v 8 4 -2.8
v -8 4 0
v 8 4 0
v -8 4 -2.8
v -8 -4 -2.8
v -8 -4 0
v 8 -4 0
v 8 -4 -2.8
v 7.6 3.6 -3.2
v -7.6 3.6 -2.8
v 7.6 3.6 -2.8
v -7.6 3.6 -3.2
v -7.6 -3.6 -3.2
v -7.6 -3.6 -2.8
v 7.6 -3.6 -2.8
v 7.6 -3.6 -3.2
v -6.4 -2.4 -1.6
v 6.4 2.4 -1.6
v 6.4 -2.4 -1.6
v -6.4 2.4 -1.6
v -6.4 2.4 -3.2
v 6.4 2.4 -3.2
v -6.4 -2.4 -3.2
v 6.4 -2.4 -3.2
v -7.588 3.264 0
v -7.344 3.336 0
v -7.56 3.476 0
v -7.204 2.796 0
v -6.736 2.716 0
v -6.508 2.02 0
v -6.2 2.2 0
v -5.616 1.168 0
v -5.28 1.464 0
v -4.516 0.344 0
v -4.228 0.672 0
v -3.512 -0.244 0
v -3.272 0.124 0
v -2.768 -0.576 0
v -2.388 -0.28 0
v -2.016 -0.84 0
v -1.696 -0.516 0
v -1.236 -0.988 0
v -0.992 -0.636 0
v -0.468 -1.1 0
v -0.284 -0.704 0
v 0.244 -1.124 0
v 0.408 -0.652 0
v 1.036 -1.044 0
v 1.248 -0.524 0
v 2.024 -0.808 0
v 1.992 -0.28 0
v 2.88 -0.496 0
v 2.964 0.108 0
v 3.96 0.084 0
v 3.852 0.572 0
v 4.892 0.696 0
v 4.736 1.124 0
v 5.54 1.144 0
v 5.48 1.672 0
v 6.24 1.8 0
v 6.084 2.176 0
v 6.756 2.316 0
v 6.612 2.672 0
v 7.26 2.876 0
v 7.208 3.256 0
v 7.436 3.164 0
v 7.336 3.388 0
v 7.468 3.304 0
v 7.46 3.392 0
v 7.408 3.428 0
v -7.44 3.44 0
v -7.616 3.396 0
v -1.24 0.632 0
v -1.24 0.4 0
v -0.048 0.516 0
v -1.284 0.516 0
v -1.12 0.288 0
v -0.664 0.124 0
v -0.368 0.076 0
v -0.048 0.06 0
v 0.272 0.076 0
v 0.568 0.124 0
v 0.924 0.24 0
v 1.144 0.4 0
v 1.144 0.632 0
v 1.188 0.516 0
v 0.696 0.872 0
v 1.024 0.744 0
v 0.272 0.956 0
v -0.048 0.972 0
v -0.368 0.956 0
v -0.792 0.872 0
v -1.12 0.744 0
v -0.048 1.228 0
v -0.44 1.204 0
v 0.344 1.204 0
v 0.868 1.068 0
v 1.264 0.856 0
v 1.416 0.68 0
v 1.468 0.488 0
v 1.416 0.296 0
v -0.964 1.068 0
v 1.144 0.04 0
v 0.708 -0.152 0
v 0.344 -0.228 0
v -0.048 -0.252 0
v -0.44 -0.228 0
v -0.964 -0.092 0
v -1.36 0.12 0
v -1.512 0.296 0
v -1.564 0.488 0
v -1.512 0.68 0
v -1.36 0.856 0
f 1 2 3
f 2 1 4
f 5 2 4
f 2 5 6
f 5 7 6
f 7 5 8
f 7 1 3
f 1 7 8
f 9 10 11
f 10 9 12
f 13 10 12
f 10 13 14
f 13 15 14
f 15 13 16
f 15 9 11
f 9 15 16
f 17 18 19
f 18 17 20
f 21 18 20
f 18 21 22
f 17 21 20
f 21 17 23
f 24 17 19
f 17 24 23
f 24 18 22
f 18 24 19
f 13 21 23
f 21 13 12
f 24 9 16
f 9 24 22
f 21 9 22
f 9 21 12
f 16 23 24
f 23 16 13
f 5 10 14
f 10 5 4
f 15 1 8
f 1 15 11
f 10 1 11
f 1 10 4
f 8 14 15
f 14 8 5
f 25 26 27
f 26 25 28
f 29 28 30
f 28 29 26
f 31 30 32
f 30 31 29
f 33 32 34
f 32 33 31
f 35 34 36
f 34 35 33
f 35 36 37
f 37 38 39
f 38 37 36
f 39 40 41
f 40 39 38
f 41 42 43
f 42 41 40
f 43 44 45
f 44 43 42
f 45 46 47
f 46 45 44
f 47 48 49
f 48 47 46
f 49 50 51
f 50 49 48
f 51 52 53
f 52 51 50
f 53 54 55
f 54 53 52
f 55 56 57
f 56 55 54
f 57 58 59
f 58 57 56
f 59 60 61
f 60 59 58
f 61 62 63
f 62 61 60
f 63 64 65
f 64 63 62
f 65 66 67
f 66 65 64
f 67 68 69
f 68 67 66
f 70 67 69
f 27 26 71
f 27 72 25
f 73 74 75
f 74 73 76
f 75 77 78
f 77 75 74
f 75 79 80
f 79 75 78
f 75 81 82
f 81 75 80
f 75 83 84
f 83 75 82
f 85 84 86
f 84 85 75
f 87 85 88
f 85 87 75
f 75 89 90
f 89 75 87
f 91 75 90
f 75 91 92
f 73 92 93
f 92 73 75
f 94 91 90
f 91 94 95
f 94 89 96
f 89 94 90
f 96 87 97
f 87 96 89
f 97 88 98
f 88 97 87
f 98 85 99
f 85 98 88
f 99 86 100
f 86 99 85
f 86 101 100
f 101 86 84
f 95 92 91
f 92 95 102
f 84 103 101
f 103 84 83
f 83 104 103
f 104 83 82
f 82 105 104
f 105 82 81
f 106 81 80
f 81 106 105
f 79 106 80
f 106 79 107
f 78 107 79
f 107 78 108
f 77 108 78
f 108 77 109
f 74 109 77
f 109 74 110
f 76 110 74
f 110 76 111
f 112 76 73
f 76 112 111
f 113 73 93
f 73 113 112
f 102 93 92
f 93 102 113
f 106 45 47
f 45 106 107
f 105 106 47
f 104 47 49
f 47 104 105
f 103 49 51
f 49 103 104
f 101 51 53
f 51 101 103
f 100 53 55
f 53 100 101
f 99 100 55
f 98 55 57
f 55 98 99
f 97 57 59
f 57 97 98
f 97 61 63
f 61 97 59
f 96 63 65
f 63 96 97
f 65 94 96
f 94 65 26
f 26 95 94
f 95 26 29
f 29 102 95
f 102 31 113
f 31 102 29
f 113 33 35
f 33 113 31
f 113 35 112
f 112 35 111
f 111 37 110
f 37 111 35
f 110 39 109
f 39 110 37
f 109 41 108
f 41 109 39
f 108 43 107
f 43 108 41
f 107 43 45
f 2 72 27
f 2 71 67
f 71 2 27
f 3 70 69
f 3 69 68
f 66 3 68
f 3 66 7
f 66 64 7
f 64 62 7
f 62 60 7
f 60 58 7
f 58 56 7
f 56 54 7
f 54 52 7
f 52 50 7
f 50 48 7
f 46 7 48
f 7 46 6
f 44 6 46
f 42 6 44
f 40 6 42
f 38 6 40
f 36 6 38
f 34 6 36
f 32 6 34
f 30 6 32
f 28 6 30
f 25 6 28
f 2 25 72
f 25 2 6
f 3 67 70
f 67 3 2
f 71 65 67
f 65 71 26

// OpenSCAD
// file: ../p/box5.scad
use <../lib.scad>
function ldraw_lib__box5() = [
// 0 Box with 5 Faces and All Edges
// 0 Name: box5.dat
// 0 Author: James Jessiman
// 0 !LDRAW_ORG Primitive UPDATE 2012-01
// 0 !LICENSE Licensed under CC BY 4.0 : see CAreadme.txt
// 
// 0 BFC CERTIFY CCW
  [0,"BFC","CERTIFY"],
  [0,"BFC","CCW"],
// 
// 0 !HISTORY 2002-04-03 [sbliss] Modified for BFC compliance
// 0 !HISTORY 2002-04-25 [PTadmin] Official Update 2002-02
// 0 !HISTORY 2007-06-24 [PTadmin] Header formatted for Contributor Agreement
// 0 !HISTORY 2008-07-01 [PTadmin] Official Update 2008-01
// 0 !HISTORY 2012-02-16 [Philo] Changed to CCW
// 0 !HISTORY 2012-03-30 [PTadmin] Official Update 2012-01
// 
// 
// 2 24 1 1 1 -1 1 1
  [2,24,1,1,1,-1,1,1],
// 2 24 -1 1 1 -1 1 -1
  [2,24,-1,1,1,-1,1,-1],
// 2 24 -1 1 -1 1 1 -1
  [2,24,-1,1,-1,1,1,-1],
// 2 24 1 1 -1 1 1 1
  [2,24,1,1,-1,1,1,1],
// 2 24 1 0 1 -1 0 1
  [2,24,1,0,1,-1,0,1],
// 2 24 -1 0 1 -1 0 -1
  [2,24,-1,0,1,-1,0,-1],
// 2 24 -1 0 -1 1 0 -1
  [2,24,-1,0,-1,1,0,-1],
// 2 24 1 0 -1 1 0 1
  [2,24,1,0,-1,1,0,1],
// 2 24 1 0 1 1 1 1
  [2,24,1,0,1,1,1,1],
// 2 24 -1 0 1 -1 1 1
  [2,24,-1,0,1,-1,1,1],
// 2 24 1 0 -1 1 1 -1
  [2,24,1,0,-1,1,1,-1],
// 2 24 -1 0 -1 -1 1 -1
  [2,24,-1,0,-1,-1,1,-1],
// 4 16 -1 1 1 1 1 1 1 1 -1 -1 1 -1
  [4,16,-1,1,1,1,1,1,1,1,-1,-1,1,-1],
// 4 16 -1 1 1 -1 0 1 1 0 1 1 1 1
  [4,16,-1,1,1,-1,0,1,1,0,1,1,1,1],
// 4 16 -1 1 -1 -1 0 -1 -1 0 1 -1 1 1
  [4,16,-1,1,-1,-1,0,-1,-1,0,1,-1,1,1],
// 4 16 1 1 -1 1 0 -1 -1 0 -1 -1 1 -1
  [4,16,1,1,-1,1,0,-1,-1,0,-1,-1,1,-1],
// 4 16 1 1 1 1 0 1 1 0 -1 1 1 -1
  [4,16,1,1,1,1,0,1,1,0,-1,1,1,-1],
];
module ldraw_lib__box5(step=0, col=false, unit=2/5, alt=false, line=0.2, solid=!$preview)
    makepoly(ldraw_lib__box5(), step=step, col=col, unit=unit, alt=alt, line=line, solid=solid);
ldraw_lib__box5(line=0.2);
// file: ../p/box4.scad
use <../lib.scad>
function ldraw_lib__box4() = [
// 0 Box with 4 Faces (2 Parallel Pairs) and All Edges
// 0 Name: box4.dat
// 0 Author: James Jessiman
// 0 !LDRAW_ORG Primitive UPDATE 2012-01
// 0 !LICENSE Licensed under CC BY 4.0 : see CAreadme.txt
// 
// 0 BFC CERTIFY CCW
  [0,"BFC","CERTIFY"],
  [0,"BFC","CCW"],
// 
// 0 !HISTORY 2002-04-03 [sbliss] Modified for BFC compliance
// 0 !HISTORY 2002-04-25 [PTadmin] Official Update 2002-02
// 0 !HISTORY 2007-06-24 [PTadmin] Header formatted for Contributor Agreement
// 0 !HISTORY 2008-07-01 [PTadmin] Official Update 2008-01
// 0 !HISTORY 2012-02-16 [Philo] Changed to CCW
// 0 !HISTORY 2012-03-30 [PTadmin] Official Update 2012-01
// 
// 
// 2 24 1 1 1 -1 1 1
  [2,24,1,1,1,-1,1,1],
// 2 24 -1 1 1 -1 1 -1
  [2,24,-1,1,1,-1,1,-1],
// 2 24 -1 1 -1 1 1 -1
  [2,24,-1,1,-1,1,1,-1],
// 2 24 1 1 -1 1 1 1
  [2,24,1,1,-1,1,1,1],
// 2 24 1 0 1 -1 0 1
  [2,24,1,0,1,-1,0,1],
// 2 24 -1 0 1 -1 0 -1
  [2,24,-1,0,1,-1,0,-1],
// 2 24 -1 0 -1 1 0 -1
  [2,24,-1,0,-1,1,0,-1],
// 2 24 1 0 -1 1 0 1
  [2,24,1,0,-1,1,0,1],
// 2 24 1 0 1 1 1 1
  [2,24,1,0,1,1,1,1],
// 2 24 -1 0 1 -1 1 1
  [2,24,-1,0,1,-1,1,1],
// 2 24 1 0 -1 1 1 -1
  [2,24,1,0,-1,1,1,-1],
// 2 24 -1 0 -1 -1 1 -1
  [2,24,-1,0,-1,-1,1,-1],
// 4 16 -1 1 1 -1 0 1 1 0 1 1 1 1
  [4,16,-1,1,1,-1,0,1,1,0,1,1,1,1],
// 4 16 -1 1 -1 -1 0 -1 -1 0 1 -1 1 1
  [4,16,-1,1,-1,-1,0,-1,-1,0,1,-1,1,1],
// 4 16 1 1 -1 1 0 -1 -1 0 -1 -1 1 -1
  [4,16,1,1,-1,1,0,-1,-1,0,-1,-1,1,-1],
// 4 16 1 1 1 1 0 1 1 0 -1 1 1 -1
  [4,16,1,1,1,1,0,1,1,0,-1,1,1,-1],
];
module ldraw_lib__box4(step=0, col=false, unit=2/5, alt=false, line=0.2, solid=!$preview)
    makepoly(ldraw_lib__box4(), step=step, col=col, unit=unit, alt=alt, line=line, solid=solid);
ldraw_lib__box4(line=0.2);
// file: s/3069bs01.scad
use <../../lib.scad>
use <../../p/box4.scad>
use <../../p/box5.scad>
function ldraw_lib__s__3069bs01() = [
// 0 ~Tile  1 x  2 with Groove without Top Face
// 0 Name: s\3069bs01.dat
// 0 Author: Santeri Piippo [arezey]
// 0 !LDRAW_ORG Subpart UPDATE 2010-02
// 0 !LICENSE Licensed under CC BY 4.0 : see CAreadme.txt
// 
// 0 BFC CERTIFY CCW
  [0,"BFC","CERTIFY"],
  [0,"BFC","CCW"],
// 
// 0 !HISTORY 2010-07-05 [PTadmin] Official Update 2010-02
// 
// 
// 1 16 0 0 0 20 0 0 0 7 0 0 0 10 box4.dat
  [1,16,0,0,0,20,0,0,0,7,0,0,0,10, ldraw_lib__box4()],
// 1 16 0 7 0 19 0 0 0 1 0 0 0 9 box4.dat
  [1,16,0,7,0,19,0,0,0,1,0,0,0,9, ldraw_lib__box4()],
// 0 BFC INVERTNEXT
  [0,"BFC","INVERTNEXT"],
// 1 16 0 8 0 16 0 0 0 -4 0 0 0 6 box5.dat
  [1,16,0,8,0,16,0,0,0,-4,0,0,0,6, ldraw_lib__box5()],
// 4 16 -19 8 9 -16 8 6 -16 8 -6 -19 8 -9
  [4,16,-19,8,9,-16,8,6,-16,8,-6,-19,8,-9],
// 4 16 19 8 -9 16 8 -6 16 8 6 19 8 9
  [4,16,19,8,-9,16,8,-6,16,8,6,19,8,9],
// 4 16 19 8 9 16 8 6 -16 8 6 -19 8 9
  [4,16,19,8,9,16,8,6,-16,8,6,-19,8,9],
// 4 16 -19 8 -9 -16 8 -6 16 8 -6 19 8 -9
  [4,16,-19,8,-9,-16,8,-6,16,8,-6,19,8,-9],
// 4 16 -20 7 10 -19 7 9 -19 7 -9 -20 7 -10
  [4,16,-20,7,10,-19,7,9,-19,7,-9,-20,7,-10],
// 4 16 20 7 -10 19 7 -9 19 7 9 20 7 10
  [4,16,20,7,-10,19,7,-9,19,7,9,20,7,10],
// 4 16 20 7 10 19 7 9 -19 7 9 -20 7 10
  [4,16,20,7,10,19,7,9,-19,7,9,-20,7,10],
// 4 16 -20 7 -10 -19 7 -9 19 7 -9 20 7 -10
  [4,16,-20,7,-10,-19,7,-9,19,7,-9,20,7,-10],
// 0 //
];
module ldraw_lib__s__3069bs01(step=0, col=false, unit=2/5, alt=false, line=0.2, solid=!$preview)
    makepoly(ldraw_lib__s__3069bs01(), step=step, col=col, unit=unit, alt=alt, line=line, solid=solid);
ldraw_lib__s__3069bs01(line=0.2);
// main file
use <../lib.scad>
use <s/3069bs01.scad>
function ldraw_lib__3069bpx4() = [
// 0 Tile  1 x  2 with Black Arc and Metallic Gold Button Pattern
// 0 Name: 3069bpx4.dat
// 0 Author: Gerald Lasser [GeraldLasser]
// 0 !LDRAW_ORG Part UPDATE 2020-03
// 0 !LICENSE Licensed under CC BY 4.0 : see CAreadme.txt
// 
// 0 BFC CERTIFY CCW
  [0,"BFC","CERTIFY"],
  [0,"BFC","CCW"],
// 
// 0 !KEYWORDS Bricklink 3069bpb376, Collectible Minifigures, Date Night Marge
// 0 !KEYWORDS Purse, The Simpsons
// 
// 0 !HISTORY 2020-12-29 [PTadmin] Official Update 2020-03
// 
// 
// 1 16 0 0 0 1 0 0 0 1 0 0 0 1 s\3069bs01.dat
  [1,16,0,0,0,1,0,0,0,1,0,0,0,1, ldraw_lib__s__3069bs01()],
// 4 0 -18.9 0 8.69 -18.97 0 8.16 -18.01 0 6.99 -18.36 0 8.34
  [4,0,-18.9,0,8.69,-18.97,0,8.16,-18.01,0,6.99,-18.36,0,8.34],
// 4 0 -16.84 0 6.79 -18.36 0 8.34 -18.01 0 6.99 -16.27 0 5.05
  [4,0,-16.84,0,6.79,-18.36,0,8.34,-18.01,0,6.99,-16.27,0,5.05],
// 4 0 -15.5 0 5.5 -16.84 0 6.79 -16.27 0 5.05 -14.04 0 2.92
  [4,0,-15.5,0,5.5,-16.84,0,6.79,-16.27,0,5.05,-14.04,0,2.92],
// 4 0 -13.2 0 3.66 -15.5 0 5.5 -14.04 0 2.92 -11.29 0 .86
  [4,0,-13.2,0,3.66,-15.5,0,5.5,-14.04,0,2.92,-11.29,0,.86],
// 4 0 -10.57 0 1.68 -13.2 0 3.66 -11.29 0 .86 -8.78 0 -.61
  [4,0,-10.57,0,1.68,-13.2,0,3.66,-11.29,0,.86,-8.78,0,-.61],
// 3 0 -10.57 0 1.68 -8.78 0 -.61 -8.18 0 .31
  [3,0,-10.57,0,1.68,-8.78,0,-.61,-8.18,0,.31],
// 4 0 -5.97 0 -.7 -8.18 0 .31 -8.78 0 -.61 -6.92 0 -1.44
  [4,0,-5.97,0,-.7,-8.18,0,.31,-8.78,0,-.61,-6.92,0,-1.44],
// 4 0 -5.97 0 -.7 -6.92 0 -1.44 -5.04 0 -2.1 -4.24 0 -1.29
  [4,0,-5.97,0,-.7,-6.92,0,-1.44,-5.04,0,-2.1,-4.24,0,-1.29],
// 4 0 -4.24 0 -1.29 -5.04 0 -2.1 -3.09 0 -2.47 -2.48 0 -1.59
  [4,0,-4.24,0,-1.29,-5.04,0,-2.1,-3.09,0,-2.47,-2.48,0,-1.59],
// 4 0 -2.48 0 -1.59 -3.09 0 -2.47 -1.17 0 -2.75 -.71 0 -1.76
  [4,0,-2.48,0,-1.59,-3.09,0,-2.47,-1.17,0,-2.75,-.71,0,-1.76],
// 4 0 -.71 0 -1.76 -1.17 0 -2.75 .61 0 -2.81 1.02 0 -1.63
  [4,0,-.71,0,-1.76,-1.17,0,-2.75,.61,0,-2.81,1.02,0,-1.63],
// 4 0 1.02 0 -1.63 .61 0 -2.81 2.59 0 -2.61 3.12 0 -1.31
  [4,0,1.02,0,-1.63,.61,0,-2.81,2.59,0,-2.61,3.12,0,-1.31],
// 4 0 3.12 0 -1.31 2.59 0 -2.61 5.06 0 -2.02 4.98 0 -.7
  [4,0,3.12,0,-1.31,2.59,0,-2.61,5.06,0,-2.02,4.98,0,-.7],
// 4 0 4.98 0 -.7 5.06 0 -2.02 7.2 0 -1.24 7.41 0 .27
  [4,0,4.98,0,-.7,5.06,0,-2.02,7.2,0,-1.24,7.41,0,.27],
// 4 0 7.41 0 .27 7.2 0 -1.24 9.9 0 .21 9.63 0 1.43
  [4,0,7.41,0,.27,7.2,0,-1.24,9.9,0,.21,9.63,0,1.43],
// 4 0 9.63 0 1.43 9.9 0 .21 12.23 0 1.74 11.84 0 2.81
  [4,0,9.63,0,1.43,9.9,0,.21,12.23,0,1.74,11.84,0,2.81],
// 4 0 11.84 0 2.81 12.23 0 1.74 13.85 0 2.86 13.7 0 4.18
  [4,0,11.84,0,2.81,12.23,0,1.74,13.85,0,2.86,13.7,0,4.18],
// 4 0 13.7 0 4.18 13.85 0 2.86 15.6 0 4.5 15.21 0 5.44
  [4,0,13.7,0,4.18,13.85,0,2.86,15.6,0,4.5,15.21,0,5.44],
// 4 0 15.21 0 5.44 15.6 0 4.5 16.89 0 5.79 16.53 0 6.68
  [4,0,15.21,0,5.44,15.6,0,4.5,16.89,0,5.79,16.53,0,6.68],
// 4 0 16.53 0 6.68 16.89 0 5.79 18.15 0 7.19 18.02 0 8.14
  [4,0,16.53,0,6.68,16.89,0,5.79,18.15,0,7.19,18.02,0,8.14],
// 4 0 18.02 0 8.14 18.15 0 7.19 18.59 0 7.91 18.34 0 8.47
  [4,0,18.02,0,8.14,18.15,0,7.19,18.59,0,7.91,18.34,0,8.47],
// 4 0 18.34 0 8.47 18.59 0 7.91 18.67 0 8.26 18.65 0 8.48
  [4,0,18.34,0,8.47,18.59,0,7.91,18.67,0,8.26,18.65,0,8.48],
// 3 0 18.52 0 8.57 18.34 0 8.47 18.65 0 8.48
  [3,0,18.52,0,8.57,18.34,0,8.47,18.65,0,8.48],
// 3 0 -18.9 0 8.69 -18.36 0 8.34 -18.6 0 8.6
  [3,0,-18.9,0,8.69,-18.36,0,8.34,-18.6,0,8.6],
// 3 0 -18.9 0 8.69 -19.04 0 8.49 -18.97 0 8.16
  [3,0,-18.9,0,8.69,-19.04,0,8.49,-18.97,0,8.16],
// 4 82 -.12 0 1.29 -3.1 0 1.58 -3.21 0 1.29 -3.1 0 1
  [4,82,-.12,0,1.29,-3.1,0,1.58,-3.21,0,1.29,-3.1,0,1],
// 4 82 -.12 0 1.29 -3.1 0 1 -2.8 0 .72 -1.66 0 .31
  [4,82,-.12,0,1.29,-3.1,0,1,-2.8,0,.72,-1.66,0,.31],
// 4 82 -.12 0 1.29 -1.66 0 .31 -.92 0 .19 -.12 0 .15
  [4,82,-.12,0,1.29,-1.66,0,.31,-.92,0,.19,-.12,0,.15],
// 4 82 -.12 0 1.29 -.12 0 .15 .68 0 .19 1.42 0 .31
  [4,82,-.12,0,1.29,-.12,0,.15,.68,0,.19,1.42,0,.31],
// 4 82 -.12 0 1.29 1.42 0 .31 2.31 0 .6 2.86 0 1
  [4,82,-.12,0,1.29,1.42,0,.31,2.31,0,.6,2.86,0,1],
// 4 82 -.12 0 1.29 2.86 0 1 2.97 0 1.29 2.86 0 1.58
  [4,82,-.12,0,1.29,2.86,0,1,2.97,0,1.29,2.86,0,1.58],
// 4 82 -.12 0 1.29 2.86 0 1.58 2.56 0 1.86 1.74 0 2.18
  [4,82,-.12,0,1.29,2.86,0,1.58,2.56,0,1.86,1.74,0,2.18],
// 4 82 -.12 0 1.29 1.74 0 2.18 .68 0 2.39 -.12 0 2.43
  [4,82,-.12,0,1.29,1.74,0,2.18,.68,0,2.39,-.12,0,2.43],
// 4 82 -.12 0 1.29 -.12 0 2.43 -.92 0 2.39 -1.98 0 2.18
  [4,82,-.12,0,1.29,-.12,0,2.43,-.92,0,2.39,-1.98,0,2.18],
// 4 82 -.12 0 1.29 -1.98 0 2.18 -2.8 0 1.86 -3.1 0 1.58
  [4,82,-.12,0,1.29,-1.98,0,2.18,-2.8,0,1.86,-3.1,0,1.58],
// 4 0 -1.1 0 3.01 -.92 0 2.39 -.12 0 2.43 -.12 0 3.07
  [4,0,-1.1,0,3.01,-.92,0,2.39,-.12,0,2.43,-.12,0,3.07],
// 4 0 -.12 0 3.07 -.12 0 2.43 .68 0 2.39 .86 0 3.01
  [4,0,-.12,0,3.07,-.12,0,2.43,.68,0,2.39,.86,0,3.01],
// 4 0 .86 0 3.01 .68 0 2.39 1.74 0 2.18 2.17 0 2.67
  [4,0,.86,0,3.01,.68,0,2.39,1.74,0,2.18,2.17,0,2.67],
// 4 0 2.17 0 2.67 1.74 0 2.18 2.56 0 1.86 3.16 0 2.14
  [4,0,2.17,0,2.67,1.74,0,2.18,2.56,0,1.86,3.16,0,2.14],
// 4 0 3.16 0 2.14 2.56 0 1.86 2.86 0 1.58 3.54 0 1.7
  [4,0,3.16,0,2.14,2.56,0,1.86,2.86,0,1.58,3.54,0,1.7],
// 4 0 3.54 0 1.7 2.86 0 1.58 2.97 0 1.29 3.67 0 1.22
  [4,0,3.54,0,1.7,2.86,0,1.58,2.97,0,1.29,3.67,0,1.22],
// 4 0 2.97 0 1.29 2.86 0 1 3.54 0 .74 3.67 0 1.22
  [4,0,2.97,0,1.29,2.86,0,1,3.54,0,.74,3.67,0,1.22],
// 4 0 -1.1 0 3.01 -2.41 0 2.67 -1.98 0 2.18 -.92 0 2.39
  [4,0,-1.1,0,3.01,-2.41,0,2.67,-1.98,0,2.18,-.92,0,2.39],
// 4 0 2.86 0 1 2.31 0 .6 2.86 0 .1 3.54 0 .74
  [4,0,2.86,0,1,2.31,0,.6,2.86,0,.1,3.54,0,.74],
// 4 0 2.31 0 .6 1.42 0 .31 1.77 0 -.38 2.86 0 .1
  [4,0,2.31,0,.6,1.42,0,.31,1.77,0,-.38,2.86,0,.1],
// 4 0 1.42 0 .31 .68 0 .19 .86 0 -.57 1.77 0 -.38
  [4,0,1.42,0,.31,.68,0,.19,.86,0,-.57,1.77,0,-.38],
// 4 0 -.12 0 .15 -.12 0 -.63 .86 0 -.57 .68 0 .19
  [4,0,-.12,0,.15,-.12,0,-.63,.86,0,-.57,.68,0,.19],
// 4 0 -.92 0 .19 -1.1 0 -.57 -.12 0 -.63 -.12 0 .15
  [4,0,-.92,0,.19,-1.1,0,-.57,-.12,0,-.63,-.12,0,.15],
// 4 0 -1.66 0 .31 -2.41 0 -.23 -1.1 0 -.57 -.92 0 .19
  [4,0,-1.66,0,.31,-2.41,0,-.23,-1.1,0,-.57,-.92,0,.19],
// 4 0 -2.8 0 .72 -3.4 0 .3 -2.41 0 -.23 -1.66 0 .31
  [4,0,-2.8,0,.72,-3.4,0,.3,-2.41,0,-.23,-1.66,0,.31],
// 4 0 -3.1 0 1 -3.78 0 .74 -3.4 0 .3 -2.8 0 .72
  [4,0,-3.1,0,1,-3.78,0,.74,-3.4,0,.3,-2.8,0,.72],
// 4 0 -3.91 0 1.22 -3.78 0 .74 -3.1 0 1 -3.21 0 1.29
  [4,0,-3.91,0,1.22,-3.78,0,.74,-3.1,0,1,-3.21,0,1.29],
// 4 0 -3.78 0 1.7 -3.91 0 1.22 -3.21 0 1.29 -3.1 0 1.58
  [4,0,-3.78,0,1.7,-3.91,0,1.22,-3.21,0,1.29,-3.1,0,1.58],
// 4 0 -3.4 0 2.14 -3.78 0 1.7 -3.1 0 1.58 -2.8 0 1.86
  [4,0,-3.4,0,2.14,-3.78,0,1.7,-3.1,0,1.58,-2.8,0,1.86],
// 4 0 -2.41 0 2.67 -3.4 0 2.14 -2.8 0 1.86 -1.98 0 2.18
  [4,0,-2.41,0,2.67,-3.4,0,2.14,-2.8,0,1.86,-1.98,0,2.18],
// 4 16 -.12 0 -.63 -1.1 0 -.57 -.71 0 -1.76 1.02 0 -1.63
  [4,16,-.12,0,-.63,-1.1,0,-.57,-.71,0,-1.76,1.02,0,-1.63],
// 3 16 .86 0 -.57 -.12 0 -.63 1.02 0 -1.63
  [3,16,.86,0,-.57,-.12,0,-.63,1.02,0,-1.63],
// 4 16 1.77 0 -.38 .86 0 -.57 1.02 0 -1.63 3.12 0 -1.31
  [4,16,1.77,0,-.38,.86,0,-.57,1.02,0,-1.63,3.12,0,-1.31],
// 4 16 2.86 0 .1 1.77 0 -.38 3.12 0 -1.31 4.98 0 -.7
  [4,16,2.86,0,.1,1.77,0,-.38,3.12,0,-1.31,4.98,0,-.7],
// 4 16 3.54 0 .74 2.86 0 .1 4.98 0 -.7 7.41 0 .27
  [4,16,3.54,0,.74,2.86,0,.1,4.98,0,-.7,7.41,0,.27],
// 4 16 3.67 0 1.22 3.54 0 .74 7.41 0 .27 9.63 0 1.43
  [4,16,3.67,0,1.22,3.54,0,.74,7.41,0,.27,9.63,0,1.43],
// 3 16 3.54 0 1.7 3.67 0 1.22 9.63 0 1.43
  [3,16,3.54,0,1.7,3.67,0,1.22,9.63,0,1.43],
// 4 16 3.16 0 2.14 3.54 0 1.7 9.63 0 1.43 11.84 0 2.81
  [4,16,3.16,0,2.14,3.54,0,1.7,9.63,0,1.43,11.84,0,2.81],
// 4 16 2.17 0 2.67 3.16 0 2.14 11.84 0 2.81 13.7 0 4.18
  [4,16,2.17,0,2.67,3.16,0,2.14,11.84,0,2.81,13.7,0,4.18],
// 4 16 2.17 0 2.67 13.7 0 4.18 15.21 0 5.44 16.53 0 6.68
  [4,16,2.17,0,2.67,13.7,0,4.18,15.21,0,5.44,16.53,0,6.68],
// 4 16 2.17 0 2.67 16.53 0 6.68 18.02 0 8.14 .86 0 3.01
  [4,16,2.17,0,2.67,16.53,0,6.68,18.02,0,8.14,.86,0,3.01],
// 4 16 -.12 0 3.07 .86 0 3.01 18.02 0 8.14 -18.36 0 8.34
  [4,16,-.12,0,3.07,.86,0,3.01,18.02,0,8.14,-18.36,0,8.34],
// 4 16 -.12 0 3.07 -18.36 0 8.34 -16.84 0 6.79 -1.1 0 3.01
  [4,16,-.12,0,3.07,-18.36,0,8.34,-16.84,0,6.79,-1.1,0,3.01],
// 3 16 -16.84 0 6.79 -2.41 0 2.67 -1.1 0 3.01
  [3,16,-16.84,0,6.79,-2.41,0,2.67,-1.1,0,3.01],
// 4 16 -3.4 0 2.14 -2.41 0 2.67 -16.84 0 6.79 -15.5 0 5.5
  [4,16,-3.4,0,2.14,-2.41,0,2.67,-16.84,0,6.79,-15.5,0,5.5],
// 4 16 -3.4 0 2.14 -15.5 0 5.5 -13.2 0 3.66 -10.57 0 1.68
  [4,16,-3.4,0,2.14,-15.5,0,5.5,-13.2,0,3.66,-10.57,0,1.68],
// 3 16 -3.4 0 2.14 -10.57 0 1.68 -3.78 0 1.7
  [3,16,-3.4,0,2.14,-10.57,0,1.68,-3.78,0,1.7],
// 3 16 -3.78 0 1.7 -10.57 0 1.68 -3.91 0 1.22
  [3,16,-3.78,0,1.7,-10.57,0,1.68,-3.91,0,1.22],
// 4 16 -3.78 0 .74 -3.91 0 1.22 -10.57 0 1.68 -8.18 0 .31
  [4,16,-3.78,0,.74,-3.91,0,1.22,-10.57,0,1.68,-8.18,0,.31],
// 4 16 -3.4 0 .3 -3.78 0 .74 -8.18 0 .31 -5.97 0 -.7
  [4,16,-3.4,0,.3,-3.78,0,.74,-8.18,0,.31,-5.97,0,-.7],
// 4 16 -3.4 0 .3 -5.97 0 -.7 -4.24 0 -1.29 -2.41 0 -.23
  [4,16,-3.4,0,.3,-5.97,0,-.7,-4.24,0,-1.29,-2.41,0,-.23],
// 4 16 -2.41 0 -.23 -4.24 0 -1.29 -2.48 0 -1.59 -1.1 0 -.57
  [4,16,-2.41,0,-.23,-4.24,0,-1.29,-2.48,0,-1.59,-1.1,0,-.57],
// 3 16 -1.1 0 -.57 -2.48 0 -1.59 -.71 0 -1.76
  [3,16,-1.1,0,-.57,-2.48,0,-1.59,-.71,0,-1.76],
// 3 16 -20 0 10 -19.04 0 8.49 -18.9 0 8.69
  [3,16,-20,0,10,-19.04,0,8.49,-18.9,0,8.69],
// 4 16 -20 0 10 -18.9 0 8.69 -18.6 0 8.6 18.34 0 8.47
  [4,16,-20,0,10,-18.9,0,8.69,-18.6,0,8.6,18.34,0,8.47],
// 3 16 20 0 10 18.52 0 8.57 18.65 0 8.48
  [3,16,20,0,10,18.52,0,8.57,18.65,0,8.48],
// 3 16 20 0 10 18.65 0 8.48 18.67 0 8.26
  [3,16,20,0,10,18.65,0,8.48,18.67,0,8.26],
// 4 16 20 0 10 18.67 0 8.26 18.59 0 7.91 20 0 -10
  [4,16,20,0,10,18.67,0,8.26,18.59,0,7.91,20,0,-10],
// 3 16 18.59 0 7.91 18.15 0 7.19 20 0 -10
  [3,16,18.59,0,7.91,18.15,0,7.19,20,0,-10],
// 3 16 18.15 0 7.19 16.89 0 5.79 20 0 -10
  [3,16,18.15,0,7.19,16.89,0,5.79,20,0,-10],
// 3 16 16.89 0 5.79 15.6 0 4.5 20 0 -10
  [3,16,16.89,0,5.79,15.6,0,4.5,20,0,-10],
// 3 16 15.6 0 4.5 13.85 0 2.86 20 0 -10
  [3,16,15.6,0,4.5,13.85,0,2.86,20,0,-10],
// 3 16 13.85 0 2.86 12.23 0 1.74 20 0 -10
  [3,16,13.85,0,2.86,12.23,0,1.74,20,0,-10],
// 3 16 12.23 0 1.74 9.9 0 .21 20 0 -10
  [3,16,12.23,0,1.74,9.9,0,.21,20,0,-10],
// 3 16 9.9 0 .21 7.2 0 -1.24 20 0 -10
  [3,16,9.9,0,.21,7.2,0,-1.24,20,0,-10],
// 3 16 7.2 0 -1.24 5.06 0 -2.02 20 0 -10
  [3,16,7.2,0,-1.24,5.06,0,-2.02,20,0,-10],
// 3 16 5.06 0 -2.02 2.59 0 -2.61 20 0 -10
  [3,16,5.06,0,-2.02,2.59,0,-2.61,20,0,-10],
// 4 16 20 0 -10 2.59 0 -2.61 .61 0 -2.81 -20 0 -10
  [4,16,20,0,-10,2.59,0,-2.61,.61,0,-2.81,-20,0,-10],
// 3 16 -1.17 0 -2.75 -20 0 -10 .61 0 -2.81
  [3,16,-1.17,0,-2.75,-20,0,-10,.61,0,-2.81],
// 3 16 -3.09 0 -2.47 -20 0 -10 -1.17 0 -2.75
  [3,16,-3.09,0,-2.47,-20,0,-10,-1.17,0,-2.75],
// 3 16 -5.04 0 -2.1 -20 0 -10 -3.09 0 -2.47
  [3,16,-5.04,0,-2.1,-20,0,-10,-3.09,0,-2.47],
// 3 16 -6.92 0 -1.44 -20 0 -10 -5.04 0 -2.1
  [3,16,-6.92,0,-1.44,-20,0,-10,-5.04,0,-2.1],
// 3 16 -8.78 0 -.61 -20 0 -10 -6.92 0 -1.44
  [3,16,-8.78,0,-.61,-20,0,-10,-6.92,0,-1.44],
// 3 16 -11.29 0 .86 -20 0 -10 -8.78 0 -.61
  [3,16,-11.29,0,.86,-20,0,-10,-8.78,0,-.61],
// 3 16 -14.04 0 2.92 -20 0 -10 -11.29 0 .86
  [3,16,-14.04,0,2.92,-20,0,-10,-11.29,0,.86],
// 3 16 -16.27 0 5.05 -20 0 -10 -14.04 0 2.92
  [3,16,-16.27,0,5.05,-20,0,-10,-14.04,0,2.92],
// 3 16 -18.01 0 6.99 -20 0 -10 -16.27 0 5.05
  [3,16,-18.01,0,6.99,-20,0,-10,-16.27,0,5.05],
// 3 16 -18.97 0 8.16 -20 0 -10 -18.01 0 6.99
  [3,16,-18.97,0,8.16,-20,0,-10,-18.01,0,6.99],
// 4 16 -20 0 -10 -18.97 0 8.16 -19.04 0 8.49 -20 0 10
  [4,16,-20,0,-10,-18.97,0,8.16,-19.04,0,8.49,-20,0,10],
// 4 16 18.34 0 8.47 18.52 0 8.57 20 0 10 -20 0 10
  [4,16,18.34,0,8.47,18.52,0,8.57,20,0,10,-20,0,10],
// 4 16 -18.6 0 8.6 -18.36 0 8.34 18.02 0 8.14 18.34 0 8.47
  [4,16,-18.6,0,8.6,-18.36,0,8.34,18.02,0,8.14,18.34,0,8.47],
];
module ldraw_lib__3069bpx4(step=0, col=false, unit=2/5, alt=false, line=0.2, solid=!$preview)
    makepoly(ldraw_lib__3069bpx4(), step=step, col=col, unit=unit, alt=alt, line=line, solid=solid);
ldraw_lib__3069bpx4(line=0.2);
